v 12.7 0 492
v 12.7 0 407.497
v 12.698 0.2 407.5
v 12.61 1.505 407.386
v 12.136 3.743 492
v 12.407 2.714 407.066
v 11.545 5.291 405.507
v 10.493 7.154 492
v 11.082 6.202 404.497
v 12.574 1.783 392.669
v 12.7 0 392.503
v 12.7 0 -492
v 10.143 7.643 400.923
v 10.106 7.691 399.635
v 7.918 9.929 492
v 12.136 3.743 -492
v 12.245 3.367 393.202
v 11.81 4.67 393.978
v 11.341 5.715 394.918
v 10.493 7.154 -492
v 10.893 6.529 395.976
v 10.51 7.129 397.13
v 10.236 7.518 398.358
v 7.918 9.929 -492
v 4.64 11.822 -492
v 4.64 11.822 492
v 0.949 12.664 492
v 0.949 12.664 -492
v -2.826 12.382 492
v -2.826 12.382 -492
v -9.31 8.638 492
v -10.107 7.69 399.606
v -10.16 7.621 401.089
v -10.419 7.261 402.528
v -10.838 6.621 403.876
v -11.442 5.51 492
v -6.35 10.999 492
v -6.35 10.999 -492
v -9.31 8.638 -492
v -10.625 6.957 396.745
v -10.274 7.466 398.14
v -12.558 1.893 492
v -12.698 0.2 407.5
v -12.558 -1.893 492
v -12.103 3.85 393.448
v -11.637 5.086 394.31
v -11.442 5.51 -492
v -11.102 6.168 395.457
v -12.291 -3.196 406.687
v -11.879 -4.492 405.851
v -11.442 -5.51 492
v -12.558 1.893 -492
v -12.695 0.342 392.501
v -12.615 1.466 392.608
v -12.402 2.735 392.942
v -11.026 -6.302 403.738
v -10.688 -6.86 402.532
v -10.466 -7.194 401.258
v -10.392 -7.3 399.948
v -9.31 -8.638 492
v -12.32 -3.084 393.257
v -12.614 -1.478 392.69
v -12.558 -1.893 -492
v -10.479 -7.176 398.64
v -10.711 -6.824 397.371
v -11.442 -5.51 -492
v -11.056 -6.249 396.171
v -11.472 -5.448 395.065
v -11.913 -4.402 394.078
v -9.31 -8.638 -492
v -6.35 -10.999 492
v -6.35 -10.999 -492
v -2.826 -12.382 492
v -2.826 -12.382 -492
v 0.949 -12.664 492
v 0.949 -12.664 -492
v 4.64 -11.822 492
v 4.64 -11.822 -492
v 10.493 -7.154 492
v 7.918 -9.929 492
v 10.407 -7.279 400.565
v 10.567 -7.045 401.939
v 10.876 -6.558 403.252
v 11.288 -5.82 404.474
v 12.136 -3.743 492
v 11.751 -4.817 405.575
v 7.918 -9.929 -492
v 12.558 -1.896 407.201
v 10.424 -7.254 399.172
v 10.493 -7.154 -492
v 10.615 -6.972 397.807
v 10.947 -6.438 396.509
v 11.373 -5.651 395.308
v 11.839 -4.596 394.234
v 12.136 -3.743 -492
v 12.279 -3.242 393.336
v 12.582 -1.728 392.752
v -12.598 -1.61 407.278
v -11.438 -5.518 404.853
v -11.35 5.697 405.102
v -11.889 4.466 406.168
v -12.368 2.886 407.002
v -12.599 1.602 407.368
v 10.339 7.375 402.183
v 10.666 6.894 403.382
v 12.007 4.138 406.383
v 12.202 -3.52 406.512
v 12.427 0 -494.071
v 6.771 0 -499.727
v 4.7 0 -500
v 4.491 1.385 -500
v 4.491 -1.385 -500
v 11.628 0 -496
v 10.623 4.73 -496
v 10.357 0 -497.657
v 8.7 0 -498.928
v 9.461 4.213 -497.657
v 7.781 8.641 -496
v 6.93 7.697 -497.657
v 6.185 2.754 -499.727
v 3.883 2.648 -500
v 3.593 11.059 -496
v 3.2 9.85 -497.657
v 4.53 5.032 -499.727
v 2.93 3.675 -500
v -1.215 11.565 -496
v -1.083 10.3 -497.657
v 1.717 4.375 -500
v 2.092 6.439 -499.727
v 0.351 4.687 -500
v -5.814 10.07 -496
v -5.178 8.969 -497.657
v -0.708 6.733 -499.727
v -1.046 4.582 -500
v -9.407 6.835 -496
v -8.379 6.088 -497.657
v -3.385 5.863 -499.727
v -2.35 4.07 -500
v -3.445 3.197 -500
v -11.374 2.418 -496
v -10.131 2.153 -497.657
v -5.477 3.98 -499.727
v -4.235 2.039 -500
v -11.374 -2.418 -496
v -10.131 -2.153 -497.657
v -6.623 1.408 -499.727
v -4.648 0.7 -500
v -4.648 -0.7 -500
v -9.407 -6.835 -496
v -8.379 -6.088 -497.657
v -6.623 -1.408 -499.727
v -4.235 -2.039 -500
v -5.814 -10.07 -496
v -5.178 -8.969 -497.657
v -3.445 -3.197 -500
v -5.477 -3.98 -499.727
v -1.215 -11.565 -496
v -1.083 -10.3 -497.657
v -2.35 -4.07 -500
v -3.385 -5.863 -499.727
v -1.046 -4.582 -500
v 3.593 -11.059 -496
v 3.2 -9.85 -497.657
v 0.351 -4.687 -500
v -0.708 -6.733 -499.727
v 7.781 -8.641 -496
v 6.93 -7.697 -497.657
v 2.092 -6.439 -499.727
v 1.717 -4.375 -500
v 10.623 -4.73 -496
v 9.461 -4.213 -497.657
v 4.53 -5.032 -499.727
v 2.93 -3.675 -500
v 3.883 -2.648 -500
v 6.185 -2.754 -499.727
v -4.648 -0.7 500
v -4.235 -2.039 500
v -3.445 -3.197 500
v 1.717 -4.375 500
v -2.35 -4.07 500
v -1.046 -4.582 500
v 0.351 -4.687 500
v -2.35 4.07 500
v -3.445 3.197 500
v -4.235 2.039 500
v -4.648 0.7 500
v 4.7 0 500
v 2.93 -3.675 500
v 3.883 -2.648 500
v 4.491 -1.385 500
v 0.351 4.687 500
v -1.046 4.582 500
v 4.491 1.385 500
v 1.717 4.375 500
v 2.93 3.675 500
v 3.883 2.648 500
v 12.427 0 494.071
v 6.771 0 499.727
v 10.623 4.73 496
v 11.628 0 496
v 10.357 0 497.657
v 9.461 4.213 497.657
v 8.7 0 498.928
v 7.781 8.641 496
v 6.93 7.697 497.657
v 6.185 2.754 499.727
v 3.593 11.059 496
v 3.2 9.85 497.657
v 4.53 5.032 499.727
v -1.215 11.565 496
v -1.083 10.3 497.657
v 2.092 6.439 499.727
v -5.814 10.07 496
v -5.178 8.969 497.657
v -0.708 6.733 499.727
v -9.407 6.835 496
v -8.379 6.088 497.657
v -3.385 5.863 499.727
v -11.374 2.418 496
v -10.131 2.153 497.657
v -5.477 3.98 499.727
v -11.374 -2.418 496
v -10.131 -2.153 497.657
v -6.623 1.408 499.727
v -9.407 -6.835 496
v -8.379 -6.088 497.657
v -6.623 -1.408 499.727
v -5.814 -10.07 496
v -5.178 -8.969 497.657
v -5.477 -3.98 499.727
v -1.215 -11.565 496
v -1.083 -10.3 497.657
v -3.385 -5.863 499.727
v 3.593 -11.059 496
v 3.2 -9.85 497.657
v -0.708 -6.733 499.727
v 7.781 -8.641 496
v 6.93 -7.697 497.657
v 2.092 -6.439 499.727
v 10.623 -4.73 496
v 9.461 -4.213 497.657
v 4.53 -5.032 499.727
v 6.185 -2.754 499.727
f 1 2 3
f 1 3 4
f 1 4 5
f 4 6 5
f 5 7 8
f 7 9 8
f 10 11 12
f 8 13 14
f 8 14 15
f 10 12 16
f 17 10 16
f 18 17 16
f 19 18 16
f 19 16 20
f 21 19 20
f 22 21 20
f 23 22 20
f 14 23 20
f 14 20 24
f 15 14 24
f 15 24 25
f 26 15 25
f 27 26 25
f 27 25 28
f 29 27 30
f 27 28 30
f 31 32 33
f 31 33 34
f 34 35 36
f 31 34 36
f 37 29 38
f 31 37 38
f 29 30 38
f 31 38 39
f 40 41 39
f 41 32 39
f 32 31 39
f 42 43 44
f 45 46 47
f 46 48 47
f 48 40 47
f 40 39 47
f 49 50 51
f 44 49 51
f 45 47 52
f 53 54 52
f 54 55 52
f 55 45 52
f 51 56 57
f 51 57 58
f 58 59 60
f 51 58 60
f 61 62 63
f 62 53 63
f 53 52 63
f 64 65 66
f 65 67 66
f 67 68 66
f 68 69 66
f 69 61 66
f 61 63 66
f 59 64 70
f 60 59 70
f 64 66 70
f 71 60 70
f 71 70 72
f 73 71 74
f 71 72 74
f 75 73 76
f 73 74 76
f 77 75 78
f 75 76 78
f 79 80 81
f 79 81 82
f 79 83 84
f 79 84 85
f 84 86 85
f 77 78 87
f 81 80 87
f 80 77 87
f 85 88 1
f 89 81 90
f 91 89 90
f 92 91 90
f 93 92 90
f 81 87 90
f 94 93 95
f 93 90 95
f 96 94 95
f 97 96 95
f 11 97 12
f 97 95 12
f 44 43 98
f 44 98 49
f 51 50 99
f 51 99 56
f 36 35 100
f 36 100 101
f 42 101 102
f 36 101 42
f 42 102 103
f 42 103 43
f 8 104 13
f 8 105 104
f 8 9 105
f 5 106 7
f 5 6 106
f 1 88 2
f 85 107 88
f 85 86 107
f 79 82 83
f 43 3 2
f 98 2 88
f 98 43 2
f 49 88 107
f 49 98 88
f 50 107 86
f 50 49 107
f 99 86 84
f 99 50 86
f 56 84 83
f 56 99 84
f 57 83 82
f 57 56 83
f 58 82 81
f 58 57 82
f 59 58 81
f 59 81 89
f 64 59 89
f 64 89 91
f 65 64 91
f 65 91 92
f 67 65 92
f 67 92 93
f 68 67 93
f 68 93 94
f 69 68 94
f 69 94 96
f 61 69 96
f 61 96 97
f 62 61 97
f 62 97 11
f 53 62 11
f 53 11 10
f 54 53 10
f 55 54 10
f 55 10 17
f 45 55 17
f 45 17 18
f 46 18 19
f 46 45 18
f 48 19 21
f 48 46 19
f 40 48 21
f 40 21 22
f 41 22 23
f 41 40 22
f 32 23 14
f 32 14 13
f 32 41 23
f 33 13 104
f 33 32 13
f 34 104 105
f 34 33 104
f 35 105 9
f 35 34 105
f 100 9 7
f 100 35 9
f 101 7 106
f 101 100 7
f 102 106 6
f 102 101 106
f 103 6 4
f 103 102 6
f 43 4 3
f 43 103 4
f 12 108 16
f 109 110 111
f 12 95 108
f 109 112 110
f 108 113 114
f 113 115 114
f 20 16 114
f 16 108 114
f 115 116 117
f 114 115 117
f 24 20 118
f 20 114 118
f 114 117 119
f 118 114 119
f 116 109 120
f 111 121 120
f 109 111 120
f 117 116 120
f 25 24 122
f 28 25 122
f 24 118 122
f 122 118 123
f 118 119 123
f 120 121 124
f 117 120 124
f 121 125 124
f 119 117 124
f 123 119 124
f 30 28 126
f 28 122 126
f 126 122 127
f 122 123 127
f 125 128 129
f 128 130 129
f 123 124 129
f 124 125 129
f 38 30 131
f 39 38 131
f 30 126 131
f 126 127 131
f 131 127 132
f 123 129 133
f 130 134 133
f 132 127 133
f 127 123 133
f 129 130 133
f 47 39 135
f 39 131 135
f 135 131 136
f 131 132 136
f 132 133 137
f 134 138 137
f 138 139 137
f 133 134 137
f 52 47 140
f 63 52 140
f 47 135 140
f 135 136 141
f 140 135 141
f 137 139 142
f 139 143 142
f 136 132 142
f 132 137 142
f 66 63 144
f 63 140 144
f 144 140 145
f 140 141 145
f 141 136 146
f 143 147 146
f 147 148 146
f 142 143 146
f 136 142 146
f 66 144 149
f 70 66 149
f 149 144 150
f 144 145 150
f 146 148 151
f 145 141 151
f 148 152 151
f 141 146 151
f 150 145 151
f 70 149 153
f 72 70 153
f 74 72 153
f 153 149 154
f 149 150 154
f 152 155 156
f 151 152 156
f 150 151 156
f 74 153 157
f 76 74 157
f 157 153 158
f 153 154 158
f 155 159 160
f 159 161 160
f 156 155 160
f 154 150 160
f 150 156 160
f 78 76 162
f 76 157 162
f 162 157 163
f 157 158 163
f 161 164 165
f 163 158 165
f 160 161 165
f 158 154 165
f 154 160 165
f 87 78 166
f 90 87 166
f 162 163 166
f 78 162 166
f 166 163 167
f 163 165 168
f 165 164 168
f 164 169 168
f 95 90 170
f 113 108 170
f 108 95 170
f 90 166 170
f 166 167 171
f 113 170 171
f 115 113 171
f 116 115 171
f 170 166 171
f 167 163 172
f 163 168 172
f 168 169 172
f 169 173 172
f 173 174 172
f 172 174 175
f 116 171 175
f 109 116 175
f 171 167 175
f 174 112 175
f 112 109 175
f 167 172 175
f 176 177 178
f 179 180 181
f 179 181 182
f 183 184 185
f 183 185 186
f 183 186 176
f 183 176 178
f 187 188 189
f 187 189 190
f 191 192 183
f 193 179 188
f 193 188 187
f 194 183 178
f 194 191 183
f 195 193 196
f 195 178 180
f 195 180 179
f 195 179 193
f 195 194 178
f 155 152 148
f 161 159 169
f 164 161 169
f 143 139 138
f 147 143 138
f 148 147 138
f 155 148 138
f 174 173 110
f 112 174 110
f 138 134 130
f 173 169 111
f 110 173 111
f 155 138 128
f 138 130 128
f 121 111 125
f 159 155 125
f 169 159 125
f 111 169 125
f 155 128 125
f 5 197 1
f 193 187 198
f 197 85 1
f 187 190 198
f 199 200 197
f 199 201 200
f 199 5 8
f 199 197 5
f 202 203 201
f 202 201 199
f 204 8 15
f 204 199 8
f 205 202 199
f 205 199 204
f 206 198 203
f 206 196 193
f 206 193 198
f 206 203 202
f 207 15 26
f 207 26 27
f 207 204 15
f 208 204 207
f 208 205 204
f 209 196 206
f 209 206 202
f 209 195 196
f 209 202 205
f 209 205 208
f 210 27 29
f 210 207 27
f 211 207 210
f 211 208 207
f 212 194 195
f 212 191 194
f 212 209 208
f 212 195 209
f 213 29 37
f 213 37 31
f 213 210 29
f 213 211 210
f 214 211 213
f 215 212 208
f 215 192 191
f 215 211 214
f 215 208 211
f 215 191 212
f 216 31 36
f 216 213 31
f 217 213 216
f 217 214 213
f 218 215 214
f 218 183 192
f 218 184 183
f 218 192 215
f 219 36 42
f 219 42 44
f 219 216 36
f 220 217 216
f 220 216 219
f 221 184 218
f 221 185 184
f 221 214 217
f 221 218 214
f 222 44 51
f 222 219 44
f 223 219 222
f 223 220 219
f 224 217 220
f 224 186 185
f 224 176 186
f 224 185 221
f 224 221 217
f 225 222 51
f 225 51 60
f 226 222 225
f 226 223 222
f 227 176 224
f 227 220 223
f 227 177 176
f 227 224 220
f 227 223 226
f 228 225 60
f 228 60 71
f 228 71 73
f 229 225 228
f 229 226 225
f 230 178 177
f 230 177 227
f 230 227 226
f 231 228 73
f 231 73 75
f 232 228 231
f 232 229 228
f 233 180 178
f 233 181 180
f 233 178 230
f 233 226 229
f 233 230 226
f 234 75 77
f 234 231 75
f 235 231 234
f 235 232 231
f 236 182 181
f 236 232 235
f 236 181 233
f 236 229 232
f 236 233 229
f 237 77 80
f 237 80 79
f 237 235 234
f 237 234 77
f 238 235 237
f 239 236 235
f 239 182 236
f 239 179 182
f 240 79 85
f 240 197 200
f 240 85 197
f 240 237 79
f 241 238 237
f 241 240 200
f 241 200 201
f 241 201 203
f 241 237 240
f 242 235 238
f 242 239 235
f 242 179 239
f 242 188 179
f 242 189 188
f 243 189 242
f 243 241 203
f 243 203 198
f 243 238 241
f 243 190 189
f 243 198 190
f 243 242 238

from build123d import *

# Parameters (mm, degrees)
BOSS_EXTRUDE1_DEPTH      = 500
BOSS_EXTRUDE1_DEPTH_BACK = 500
SKETCH1_R                = 12.7
FILLET1_R                = 8
CUT_EXTRUDE1_DEPTH       = 15
CUT_EXTRUDE1_DEPTH_BACK  = 19
SKETCH3_R                = 7.5


with BuildPart() as part:
    # Sketch1 → Boss-Extrude1 (new, two sides: drawn at the far end of the back side and taken through both)
    with BuildSketch(Plane.XY.offset(-BOSS_EXTRUDE1_DEPTH_BACK)):
        Circle(SKETCH1_R)
    extrude(amount=BOSS_EXTRUDE1_DEPTH + BOSS_EXTRUDE1_DEPTH_BACK)

    # Fillet1
    fillet1_edges = [part.edges().sort_by_distance(p)[0] for p in [
        (-12.7, 0, 500),
        (-12.7, 0, -500),
    ]]
    fillet(fillet1_edges, radius=FILLET1_R)

    # Sketch3 → Cut-Extrude1 (cut, two sides: drawn at the far end of the back side and taken through both)
    with BuildSketch(Plane(origin=(0, 0, 0), x_dir=(0, 0, -1), z_dir=(1, 0, 0)).offset(-CUT_EXTRUDE1_DEPTH_BACK)):
        with Locations((-400, 0.2)):
            Circle(SKETCH3_R)
    extrude(amount=CUT_EXTRUDE1_DEPTH + CUT_EXTRUDE1_DEPTH_BACK, mode=Mode.SUBTRACT)


solid = part.part
